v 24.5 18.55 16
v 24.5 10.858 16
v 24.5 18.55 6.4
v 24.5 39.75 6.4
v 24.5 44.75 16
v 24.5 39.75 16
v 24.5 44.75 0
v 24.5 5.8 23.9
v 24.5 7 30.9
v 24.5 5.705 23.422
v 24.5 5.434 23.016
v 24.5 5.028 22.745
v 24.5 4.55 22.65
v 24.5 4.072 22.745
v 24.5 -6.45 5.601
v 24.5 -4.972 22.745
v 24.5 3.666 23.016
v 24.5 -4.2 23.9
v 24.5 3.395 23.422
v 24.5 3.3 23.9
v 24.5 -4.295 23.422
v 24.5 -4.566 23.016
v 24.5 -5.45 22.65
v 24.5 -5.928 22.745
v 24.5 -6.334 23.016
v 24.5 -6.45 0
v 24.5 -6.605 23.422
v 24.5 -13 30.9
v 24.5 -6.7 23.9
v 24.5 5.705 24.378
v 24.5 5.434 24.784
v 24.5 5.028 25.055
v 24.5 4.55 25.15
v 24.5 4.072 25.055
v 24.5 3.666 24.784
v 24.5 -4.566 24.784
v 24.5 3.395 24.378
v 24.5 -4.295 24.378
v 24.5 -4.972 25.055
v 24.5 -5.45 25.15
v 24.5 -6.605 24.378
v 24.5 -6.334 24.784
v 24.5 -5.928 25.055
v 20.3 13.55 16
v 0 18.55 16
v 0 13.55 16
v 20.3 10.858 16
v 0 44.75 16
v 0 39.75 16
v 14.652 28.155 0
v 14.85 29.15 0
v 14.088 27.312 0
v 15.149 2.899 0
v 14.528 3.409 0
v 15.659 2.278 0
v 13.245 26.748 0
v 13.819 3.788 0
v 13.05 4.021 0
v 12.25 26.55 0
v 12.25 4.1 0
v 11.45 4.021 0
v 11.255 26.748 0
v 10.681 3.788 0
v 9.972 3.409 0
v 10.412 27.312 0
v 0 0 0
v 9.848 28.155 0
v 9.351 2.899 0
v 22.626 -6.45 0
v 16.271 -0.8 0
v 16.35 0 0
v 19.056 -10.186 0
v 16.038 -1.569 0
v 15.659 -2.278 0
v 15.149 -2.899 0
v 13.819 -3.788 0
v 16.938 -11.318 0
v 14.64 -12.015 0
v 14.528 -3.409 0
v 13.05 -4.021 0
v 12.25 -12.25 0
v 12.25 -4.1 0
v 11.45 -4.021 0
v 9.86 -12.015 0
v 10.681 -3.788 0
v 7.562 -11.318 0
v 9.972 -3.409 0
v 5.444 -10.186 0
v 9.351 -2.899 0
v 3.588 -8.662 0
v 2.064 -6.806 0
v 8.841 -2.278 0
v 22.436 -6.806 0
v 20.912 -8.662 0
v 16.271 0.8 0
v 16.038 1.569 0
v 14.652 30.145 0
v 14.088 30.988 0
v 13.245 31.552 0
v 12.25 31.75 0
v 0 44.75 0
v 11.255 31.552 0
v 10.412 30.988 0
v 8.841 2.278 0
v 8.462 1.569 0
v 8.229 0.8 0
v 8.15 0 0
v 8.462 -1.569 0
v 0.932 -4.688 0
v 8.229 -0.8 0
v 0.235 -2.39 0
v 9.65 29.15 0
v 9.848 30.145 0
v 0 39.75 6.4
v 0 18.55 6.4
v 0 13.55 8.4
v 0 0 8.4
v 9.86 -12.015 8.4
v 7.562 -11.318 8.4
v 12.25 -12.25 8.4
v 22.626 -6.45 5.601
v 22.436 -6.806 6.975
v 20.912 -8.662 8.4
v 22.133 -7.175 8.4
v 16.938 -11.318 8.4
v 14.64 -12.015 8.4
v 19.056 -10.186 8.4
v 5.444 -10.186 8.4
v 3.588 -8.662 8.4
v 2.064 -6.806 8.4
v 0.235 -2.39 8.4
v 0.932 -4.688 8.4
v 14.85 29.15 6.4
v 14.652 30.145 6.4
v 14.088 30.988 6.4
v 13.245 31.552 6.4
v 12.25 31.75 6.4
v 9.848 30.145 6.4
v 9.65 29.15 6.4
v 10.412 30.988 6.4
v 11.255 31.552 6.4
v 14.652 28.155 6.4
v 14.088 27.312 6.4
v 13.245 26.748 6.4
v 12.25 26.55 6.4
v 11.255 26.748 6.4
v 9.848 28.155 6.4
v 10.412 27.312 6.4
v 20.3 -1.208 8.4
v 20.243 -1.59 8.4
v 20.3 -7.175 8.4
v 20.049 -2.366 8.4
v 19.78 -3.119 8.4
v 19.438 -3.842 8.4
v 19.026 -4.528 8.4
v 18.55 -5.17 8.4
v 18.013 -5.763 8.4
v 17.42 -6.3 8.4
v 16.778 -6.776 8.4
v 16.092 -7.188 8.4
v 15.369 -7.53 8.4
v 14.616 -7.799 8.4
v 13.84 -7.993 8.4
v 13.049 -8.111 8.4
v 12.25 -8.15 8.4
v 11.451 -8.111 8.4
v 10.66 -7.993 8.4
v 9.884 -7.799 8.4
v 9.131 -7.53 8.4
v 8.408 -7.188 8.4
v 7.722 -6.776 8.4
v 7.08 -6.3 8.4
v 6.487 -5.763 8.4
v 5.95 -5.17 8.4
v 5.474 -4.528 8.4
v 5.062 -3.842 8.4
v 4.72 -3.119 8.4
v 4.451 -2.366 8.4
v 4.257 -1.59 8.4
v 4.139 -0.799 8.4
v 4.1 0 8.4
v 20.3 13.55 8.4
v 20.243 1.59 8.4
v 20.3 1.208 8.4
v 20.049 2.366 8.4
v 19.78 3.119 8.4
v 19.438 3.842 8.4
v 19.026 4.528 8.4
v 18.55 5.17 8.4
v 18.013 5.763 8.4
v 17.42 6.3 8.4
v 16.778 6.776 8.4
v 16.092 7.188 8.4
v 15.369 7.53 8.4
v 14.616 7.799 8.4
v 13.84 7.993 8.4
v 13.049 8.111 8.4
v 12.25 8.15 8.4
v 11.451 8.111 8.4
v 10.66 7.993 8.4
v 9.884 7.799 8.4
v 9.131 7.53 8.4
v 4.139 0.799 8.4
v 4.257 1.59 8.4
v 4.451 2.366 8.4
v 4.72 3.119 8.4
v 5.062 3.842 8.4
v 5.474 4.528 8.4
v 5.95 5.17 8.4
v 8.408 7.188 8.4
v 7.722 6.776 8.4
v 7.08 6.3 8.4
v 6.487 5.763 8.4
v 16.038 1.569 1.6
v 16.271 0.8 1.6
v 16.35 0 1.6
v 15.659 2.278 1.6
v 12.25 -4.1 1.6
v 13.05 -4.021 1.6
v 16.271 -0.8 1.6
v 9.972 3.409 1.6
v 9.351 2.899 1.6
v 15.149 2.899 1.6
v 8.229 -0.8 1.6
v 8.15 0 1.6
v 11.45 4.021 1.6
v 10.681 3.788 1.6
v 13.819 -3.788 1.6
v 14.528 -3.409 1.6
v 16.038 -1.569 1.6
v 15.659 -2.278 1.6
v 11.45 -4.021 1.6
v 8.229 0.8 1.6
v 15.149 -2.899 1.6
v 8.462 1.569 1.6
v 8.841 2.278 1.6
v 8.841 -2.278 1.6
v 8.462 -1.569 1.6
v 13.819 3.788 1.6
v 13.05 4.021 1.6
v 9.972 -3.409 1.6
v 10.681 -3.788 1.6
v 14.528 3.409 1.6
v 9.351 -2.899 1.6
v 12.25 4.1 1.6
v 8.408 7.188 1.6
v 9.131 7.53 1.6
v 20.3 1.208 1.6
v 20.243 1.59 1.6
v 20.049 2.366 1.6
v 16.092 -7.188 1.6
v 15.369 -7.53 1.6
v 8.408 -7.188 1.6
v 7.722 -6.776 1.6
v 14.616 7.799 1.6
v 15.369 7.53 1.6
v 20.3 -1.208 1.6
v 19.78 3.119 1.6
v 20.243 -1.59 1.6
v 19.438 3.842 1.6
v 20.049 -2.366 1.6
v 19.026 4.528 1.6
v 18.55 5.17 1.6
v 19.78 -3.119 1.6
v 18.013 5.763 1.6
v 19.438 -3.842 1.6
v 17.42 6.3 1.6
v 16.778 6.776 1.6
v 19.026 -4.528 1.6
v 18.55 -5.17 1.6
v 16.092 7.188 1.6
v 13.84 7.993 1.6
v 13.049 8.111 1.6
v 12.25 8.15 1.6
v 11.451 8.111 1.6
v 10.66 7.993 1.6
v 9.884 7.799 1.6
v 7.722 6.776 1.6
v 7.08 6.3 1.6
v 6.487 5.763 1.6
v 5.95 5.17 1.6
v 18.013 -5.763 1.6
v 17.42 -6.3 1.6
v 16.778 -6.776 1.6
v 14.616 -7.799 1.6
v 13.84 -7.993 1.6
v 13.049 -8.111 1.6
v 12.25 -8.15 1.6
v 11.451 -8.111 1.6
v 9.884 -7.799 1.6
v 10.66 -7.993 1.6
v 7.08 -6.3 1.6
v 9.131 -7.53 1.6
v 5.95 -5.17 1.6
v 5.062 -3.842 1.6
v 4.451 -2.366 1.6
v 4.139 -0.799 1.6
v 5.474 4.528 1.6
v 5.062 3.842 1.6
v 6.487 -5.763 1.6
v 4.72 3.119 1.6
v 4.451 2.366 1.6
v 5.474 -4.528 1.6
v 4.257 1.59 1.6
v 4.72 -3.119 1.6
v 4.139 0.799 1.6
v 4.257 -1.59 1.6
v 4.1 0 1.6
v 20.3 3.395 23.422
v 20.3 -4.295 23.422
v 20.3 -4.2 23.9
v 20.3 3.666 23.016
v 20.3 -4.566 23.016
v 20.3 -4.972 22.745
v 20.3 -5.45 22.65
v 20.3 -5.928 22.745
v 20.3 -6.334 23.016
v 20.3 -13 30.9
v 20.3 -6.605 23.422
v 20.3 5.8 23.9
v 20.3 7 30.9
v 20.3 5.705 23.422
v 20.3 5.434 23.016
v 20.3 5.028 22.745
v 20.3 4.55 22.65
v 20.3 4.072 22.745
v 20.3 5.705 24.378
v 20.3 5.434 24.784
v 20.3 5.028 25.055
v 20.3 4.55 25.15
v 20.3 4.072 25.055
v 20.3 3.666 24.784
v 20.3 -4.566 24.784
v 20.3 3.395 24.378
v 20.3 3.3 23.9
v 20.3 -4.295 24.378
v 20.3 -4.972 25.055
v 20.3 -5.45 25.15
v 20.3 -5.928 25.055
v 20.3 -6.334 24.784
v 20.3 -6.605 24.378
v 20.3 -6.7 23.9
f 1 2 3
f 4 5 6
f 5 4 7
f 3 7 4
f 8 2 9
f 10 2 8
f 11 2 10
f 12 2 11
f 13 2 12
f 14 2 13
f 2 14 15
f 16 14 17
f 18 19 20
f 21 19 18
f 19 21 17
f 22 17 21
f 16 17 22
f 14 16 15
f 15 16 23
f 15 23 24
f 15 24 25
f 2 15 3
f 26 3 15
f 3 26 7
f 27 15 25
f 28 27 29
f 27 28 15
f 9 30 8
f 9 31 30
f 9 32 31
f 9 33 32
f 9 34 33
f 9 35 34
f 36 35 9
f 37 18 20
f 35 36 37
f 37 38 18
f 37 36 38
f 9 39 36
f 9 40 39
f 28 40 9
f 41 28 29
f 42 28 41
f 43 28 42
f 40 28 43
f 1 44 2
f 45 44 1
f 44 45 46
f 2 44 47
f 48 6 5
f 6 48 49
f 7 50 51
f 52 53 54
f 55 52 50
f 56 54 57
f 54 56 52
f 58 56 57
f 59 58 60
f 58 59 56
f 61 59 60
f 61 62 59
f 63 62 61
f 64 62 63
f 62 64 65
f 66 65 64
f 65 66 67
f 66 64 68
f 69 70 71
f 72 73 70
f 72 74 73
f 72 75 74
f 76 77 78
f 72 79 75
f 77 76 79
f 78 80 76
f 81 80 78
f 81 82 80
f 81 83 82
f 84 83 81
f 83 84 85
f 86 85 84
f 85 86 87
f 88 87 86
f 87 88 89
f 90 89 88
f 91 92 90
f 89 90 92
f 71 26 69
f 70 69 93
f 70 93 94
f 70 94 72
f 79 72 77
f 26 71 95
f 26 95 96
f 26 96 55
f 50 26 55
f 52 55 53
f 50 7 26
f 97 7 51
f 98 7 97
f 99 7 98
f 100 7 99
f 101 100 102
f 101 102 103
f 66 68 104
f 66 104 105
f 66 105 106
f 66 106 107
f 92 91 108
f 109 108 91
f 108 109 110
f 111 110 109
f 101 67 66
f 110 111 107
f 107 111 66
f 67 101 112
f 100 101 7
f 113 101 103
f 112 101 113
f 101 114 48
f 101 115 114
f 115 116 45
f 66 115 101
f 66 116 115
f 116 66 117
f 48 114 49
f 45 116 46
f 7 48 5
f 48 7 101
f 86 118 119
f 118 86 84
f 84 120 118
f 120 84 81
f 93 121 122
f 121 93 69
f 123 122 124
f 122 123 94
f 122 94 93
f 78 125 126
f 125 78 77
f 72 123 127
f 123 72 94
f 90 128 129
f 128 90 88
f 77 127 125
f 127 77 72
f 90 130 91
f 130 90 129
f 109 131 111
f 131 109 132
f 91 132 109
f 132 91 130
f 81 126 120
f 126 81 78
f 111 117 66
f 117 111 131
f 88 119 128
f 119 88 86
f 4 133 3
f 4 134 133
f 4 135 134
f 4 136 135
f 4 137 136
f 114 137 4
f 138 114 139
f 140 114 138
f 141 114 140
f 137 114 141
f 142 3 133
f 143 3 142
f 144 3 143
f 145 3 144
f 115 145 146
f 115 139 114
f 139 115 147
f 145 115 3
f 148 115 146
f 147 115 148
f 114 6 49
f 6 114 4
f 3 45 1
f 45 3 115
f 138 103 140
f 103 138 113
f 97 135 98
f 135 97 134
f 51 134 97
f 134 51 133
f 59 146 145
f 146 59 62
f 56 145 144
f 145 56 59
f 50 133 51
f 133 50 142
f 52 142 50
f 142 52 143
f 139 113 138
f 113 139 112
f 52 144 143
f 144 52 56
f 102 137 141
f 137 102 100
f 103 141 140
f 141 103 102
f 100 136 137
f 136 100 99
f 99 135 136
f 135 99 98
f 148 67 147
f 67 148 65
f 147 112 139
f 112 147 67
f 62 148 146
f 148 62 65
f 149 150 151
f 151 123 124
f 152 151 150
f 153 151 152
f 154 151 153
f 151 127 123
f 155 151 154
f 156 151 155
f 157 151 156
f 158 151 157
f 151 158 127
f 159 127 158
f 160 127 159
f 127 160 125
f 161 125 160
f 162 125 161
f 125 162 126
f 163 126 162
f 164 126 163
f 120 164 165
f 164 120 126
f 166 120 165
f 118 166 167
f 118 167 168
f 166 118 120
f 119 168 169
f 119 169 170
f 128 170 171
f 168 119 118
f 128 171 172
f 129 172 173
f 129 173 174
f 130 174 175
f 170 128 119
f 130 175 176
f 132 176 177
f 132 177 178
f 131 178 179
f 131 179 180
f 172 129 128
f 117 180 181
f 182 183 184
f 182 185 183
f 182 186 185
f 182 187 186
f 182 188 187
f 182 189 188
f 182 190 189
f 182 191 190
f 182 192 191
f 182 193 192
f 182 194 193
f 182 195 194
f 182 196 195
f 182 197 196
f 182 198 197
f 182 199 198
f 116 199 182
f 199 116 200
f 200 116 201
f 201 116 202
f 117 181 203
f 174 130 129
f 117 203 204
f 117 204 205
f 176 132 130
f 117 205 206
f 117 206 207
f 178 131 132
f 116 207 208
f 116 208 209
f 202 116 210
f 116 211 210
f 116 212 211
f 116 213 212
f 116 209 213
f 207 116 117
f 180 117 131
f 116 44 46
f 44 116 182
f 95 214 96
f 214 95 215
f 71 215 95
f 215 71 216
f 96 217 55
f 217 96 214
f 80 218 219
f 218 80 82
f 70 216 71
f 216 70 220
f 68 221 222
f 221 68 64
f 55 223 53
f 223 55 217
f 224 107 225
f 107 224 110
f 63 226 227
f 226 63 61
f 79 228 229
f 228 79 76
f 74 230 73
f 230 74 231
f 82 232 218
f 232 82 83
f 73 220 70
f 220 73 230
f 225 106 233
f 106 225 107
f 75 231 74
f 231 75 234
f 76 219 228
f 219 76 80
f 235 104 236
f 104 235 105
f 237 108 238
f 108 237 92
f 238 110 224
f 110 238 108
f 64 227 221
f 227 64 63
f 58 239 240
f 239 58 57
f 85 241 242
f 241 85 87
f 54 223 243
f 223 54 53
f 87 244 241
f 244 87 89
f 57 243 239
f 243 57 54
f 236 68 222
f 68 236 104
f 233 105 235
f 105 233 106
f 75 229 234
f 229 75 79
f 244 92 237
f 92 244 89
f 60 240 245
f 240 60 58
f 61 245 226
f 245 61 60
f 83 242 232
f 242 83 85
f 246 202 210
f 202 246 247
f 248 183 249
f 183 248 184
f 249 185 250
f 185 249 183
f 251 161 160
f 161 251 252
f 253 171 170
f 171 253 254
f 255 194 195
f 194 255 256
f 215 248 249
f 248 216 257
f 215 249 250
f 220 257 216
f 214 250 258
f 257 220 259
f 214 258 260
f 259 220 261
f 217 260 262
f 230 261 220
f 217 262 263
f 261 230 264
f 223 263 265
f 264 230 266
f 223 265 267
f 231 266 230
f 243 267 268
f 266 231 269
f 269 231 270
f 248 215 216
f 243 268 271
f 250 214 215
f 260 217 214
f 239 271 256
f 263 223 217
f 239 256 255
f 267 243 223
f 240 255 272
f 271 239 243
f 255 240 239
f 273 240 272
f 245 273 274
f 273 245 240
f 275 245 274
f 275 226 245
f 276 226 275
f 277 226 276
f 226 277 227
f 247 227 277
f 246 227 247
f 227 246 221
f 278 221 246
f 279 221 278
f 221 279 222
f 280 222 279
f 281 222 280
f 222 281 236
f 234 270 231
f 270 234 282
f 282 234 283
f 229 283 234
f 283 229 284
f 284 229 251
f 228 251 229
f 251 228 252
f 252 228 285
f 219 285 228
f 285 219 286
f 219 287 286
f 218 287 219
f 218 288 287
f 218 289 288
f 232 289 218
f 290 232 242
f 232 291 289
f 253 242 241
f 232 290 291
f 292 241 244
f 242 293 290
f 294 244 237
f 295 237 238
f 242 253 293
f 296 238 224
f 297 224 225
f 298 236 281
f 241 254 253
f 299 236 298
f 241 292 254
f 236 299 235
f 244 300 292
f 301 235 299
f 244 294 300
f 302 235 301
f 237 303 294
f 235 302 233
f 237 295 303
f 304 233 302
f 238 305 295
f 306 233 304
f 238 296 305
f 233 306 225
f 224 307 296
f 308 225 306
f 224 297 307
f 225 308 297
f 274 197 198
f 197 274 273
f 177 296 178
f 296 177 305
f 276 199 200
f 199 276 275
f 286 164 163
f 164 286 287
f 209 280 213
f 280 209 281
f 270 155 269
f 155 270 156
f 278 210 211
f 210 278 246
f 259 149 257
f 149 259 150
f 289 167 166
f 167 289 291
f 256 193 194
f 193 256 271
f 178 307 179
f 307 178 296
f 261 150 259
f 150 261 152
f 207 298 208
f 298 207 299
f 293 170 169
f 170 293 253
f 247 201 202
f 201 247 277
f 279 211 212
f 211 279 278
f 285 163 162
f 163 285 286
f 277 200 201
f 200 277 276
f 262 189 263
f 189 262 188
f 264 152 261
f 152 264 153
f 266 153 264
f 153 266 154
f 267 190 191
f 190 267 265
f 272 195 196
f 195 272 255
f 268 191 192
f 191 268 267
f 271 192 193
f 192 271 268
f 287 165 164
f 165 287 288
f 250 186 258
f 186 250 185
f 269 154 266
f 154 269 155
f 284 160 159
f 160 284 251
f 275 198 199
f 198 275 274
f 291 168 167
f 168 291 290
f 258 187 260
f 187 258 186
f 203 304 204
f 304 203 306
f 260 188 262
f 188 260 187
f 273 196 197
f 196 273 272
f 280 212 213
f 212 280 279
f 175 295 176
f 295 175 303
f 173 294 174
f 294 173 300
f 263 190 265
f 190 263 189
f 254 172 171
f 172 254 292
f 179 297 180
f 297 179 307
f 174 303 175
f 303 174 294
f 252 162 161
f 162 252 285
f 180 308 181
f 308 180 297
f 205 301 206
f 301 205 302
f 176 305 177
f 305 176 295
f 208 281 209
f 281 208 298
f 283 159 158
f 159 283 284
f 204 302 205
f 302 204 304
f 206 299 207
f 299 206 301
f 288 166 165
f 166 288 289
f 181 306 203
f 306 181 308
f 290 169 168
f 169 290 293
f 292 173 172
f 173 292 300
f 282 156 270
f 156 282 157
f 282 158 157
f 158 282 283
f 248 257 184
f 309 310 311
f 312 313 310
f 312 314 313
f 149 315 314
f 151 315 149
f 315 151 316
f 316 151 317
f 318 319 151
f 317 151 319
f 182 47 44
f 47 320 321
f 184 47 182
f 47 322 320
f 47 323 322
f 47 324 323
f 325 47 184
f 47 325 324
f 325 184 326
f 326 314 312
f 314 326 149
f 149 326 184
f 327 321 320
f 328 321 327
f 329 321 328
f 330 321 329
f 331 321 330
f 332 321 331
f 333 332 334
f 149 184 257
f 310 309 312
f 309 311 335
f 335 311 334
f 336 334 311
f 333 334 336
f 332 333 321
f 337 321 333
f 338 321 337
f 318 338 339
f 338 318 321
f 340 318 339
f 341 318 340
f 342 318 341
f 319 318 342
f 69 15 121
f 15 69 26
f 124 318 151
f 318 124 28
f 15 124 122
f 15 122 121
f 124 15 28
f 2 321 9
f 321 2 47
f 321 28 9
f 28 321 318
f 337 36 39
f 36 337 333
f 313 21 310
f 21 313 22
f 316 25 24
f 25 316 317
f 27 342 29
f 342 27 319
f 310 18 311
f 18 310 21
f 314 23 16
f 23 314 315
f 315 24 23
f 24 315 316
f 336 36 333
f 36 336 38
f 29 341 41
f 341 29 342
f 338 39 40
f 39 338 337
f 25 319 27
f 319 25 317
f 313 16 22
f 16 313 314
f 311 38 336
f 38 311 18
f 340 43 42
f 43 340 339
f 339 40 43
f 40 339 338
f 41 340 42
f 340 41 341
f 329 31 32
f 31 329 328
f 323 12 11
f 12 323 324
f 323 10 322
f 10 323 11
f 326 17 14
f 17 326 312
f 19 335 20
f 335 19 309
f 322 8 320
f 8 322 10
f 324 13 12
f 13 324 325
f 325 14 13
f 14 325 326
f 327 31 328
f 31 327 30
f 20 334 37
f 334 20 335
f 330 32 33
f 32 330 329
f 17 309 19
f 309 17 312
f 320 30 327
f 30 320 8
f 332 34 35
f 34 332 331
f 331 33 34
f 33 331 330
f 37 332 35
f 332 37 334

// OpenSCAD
////customisation alfawise c10 - axe X nouvelle pièce pour intégrer la fixation d'une fin de course (à l'opposé du moteur
echo(version=version());

epsilon=0.1;
diam_vis=8.2;
diam_roulement=16+epsilon;
diam_fixation=5;
largeur=24.5;
hauteur=16;
longueur=57;
haut_roulement=6+epsilon;
haut_encoche=hauteur-6.3;
haut_vis=hauteur-8.3;
long_encoche=21+2*epsilon;
long_guide=5;
long_vis=longueur-long_encoche-2*long_guide;
haut_inter=haut_encoche+long_encoche;
long_inter=20;
diam_fix_inter=2.5;
pas_fix_inter=5;//un pas depuis le bord, deux pas entre les deux trous et un autre pas jusqu'à l'autre bord
shift_fix_inter=7;
shift_inter=8;

module prism(l, w, h){
    polyhedron(
    points=[[0,0,0], [l,0,0], [l,w,0], [0,w,0], [0,w,h], [l,w,h]],
    faces=[[0,1,2,3],[5,4,3,2],[0,4,5,1],[0,3,4],[5,2,1]]
    );
}
union(){
    //pièce originale
    difference(){
        //forme de base
        union(){
            cube([largeur,longueur-(largeur/2),hauteur],0);
            translate([(largeur/2),0,0]){
                cylinder(hauteur,(largeur/2),(largeur/2),$fn=32);
            }
        }
        //retraits
        union(){
            //encoche rail
            translate([-epsilon,longueur-(largeur/2)-(long_guide+long_encoche),hauteur-haut_encoche+epsilon]){
                cube([largeur+2*epsilon,long_encoche,haut_encoche],0);
            }
            //trou fixation
            translate([(largeur/2),longueur-(largeur/2)-(long_guide+long_encoche/2),-epsilon]){
                cylinder(hauteur+2*epsilon,diam_fixation/2+epsilon,diam_fixation/2+epsilon,$fn=16);
            }
            //encoche vis
            translate([-epsilon,-(largeur/2),hauteur-haut_vis+epsilon]){
                cube([largeur+2*epsilon,long_vis,haut_vis],0);
            }
            //trou vis
            translate([(largeur/2),0,-epsilon]){
                cylinder(hauteur+2*epsilon,diam_vis/2,diam_vis/2,$fn=32);
            }
            //trou roulement
            translate([(largeur/2),0,haut_vis-haut_roulement]){
                cylinder(hauteur+2*epsilon,diam_roulement/2+epsilon,diam_roulement/2+epsilon,$fn=64);
            }
        }
    }
    //fixation interupteur fin de course
    difference(){
        //platine
        union(){
            translate([largeur-(largeur-diam_roulement)/2,-largeur/2+long_vis-long_inter,0]){
            cube([(largeur-diam_roulement)/2,long_inter,hauteur],0);
        }
        translate([largeur,long_inter-long_guide,0]){
            rotate([90,0,-90]){
                a=[[0,0],[long_inter,0],[long_inter+shift_inter,haut_inter],[shift_inter,haut_inter]];
                linear_extrude((largeur-diam_roulement)/2) polygon(a);
            }
        }}
        //2x trous fixation inter
        union(){
            translate([largeur-(largeur-diam_roulement)/2-epsilon,pas_fix_inter-largeur/2+long_vis-long_inter-shift_inter/2,haut_inter-shift_fix_inter]){
                rotate([0,90,0]){
                    cylinder((largeur-diam_roulement)/2+2*epsilon,diam_fix_inter/2,diam_fix_inter/2,$fn=16);
                }
            }
            translate([largeur-(largeur-diam_roulement)/2-epsilon,3*pas_fix_inter-largeur/2+long_vis-long_inter-shift_inter/2,haut_inter-shift_fix_inter]){
                rotate([0,90,0]){
                    cylinder((largeur-diam_roulement)/2+2*epsilon,diam_fix_inter/2,diam_fix_inter/2,$fn=16);
                }
            }
        }
    }
}
